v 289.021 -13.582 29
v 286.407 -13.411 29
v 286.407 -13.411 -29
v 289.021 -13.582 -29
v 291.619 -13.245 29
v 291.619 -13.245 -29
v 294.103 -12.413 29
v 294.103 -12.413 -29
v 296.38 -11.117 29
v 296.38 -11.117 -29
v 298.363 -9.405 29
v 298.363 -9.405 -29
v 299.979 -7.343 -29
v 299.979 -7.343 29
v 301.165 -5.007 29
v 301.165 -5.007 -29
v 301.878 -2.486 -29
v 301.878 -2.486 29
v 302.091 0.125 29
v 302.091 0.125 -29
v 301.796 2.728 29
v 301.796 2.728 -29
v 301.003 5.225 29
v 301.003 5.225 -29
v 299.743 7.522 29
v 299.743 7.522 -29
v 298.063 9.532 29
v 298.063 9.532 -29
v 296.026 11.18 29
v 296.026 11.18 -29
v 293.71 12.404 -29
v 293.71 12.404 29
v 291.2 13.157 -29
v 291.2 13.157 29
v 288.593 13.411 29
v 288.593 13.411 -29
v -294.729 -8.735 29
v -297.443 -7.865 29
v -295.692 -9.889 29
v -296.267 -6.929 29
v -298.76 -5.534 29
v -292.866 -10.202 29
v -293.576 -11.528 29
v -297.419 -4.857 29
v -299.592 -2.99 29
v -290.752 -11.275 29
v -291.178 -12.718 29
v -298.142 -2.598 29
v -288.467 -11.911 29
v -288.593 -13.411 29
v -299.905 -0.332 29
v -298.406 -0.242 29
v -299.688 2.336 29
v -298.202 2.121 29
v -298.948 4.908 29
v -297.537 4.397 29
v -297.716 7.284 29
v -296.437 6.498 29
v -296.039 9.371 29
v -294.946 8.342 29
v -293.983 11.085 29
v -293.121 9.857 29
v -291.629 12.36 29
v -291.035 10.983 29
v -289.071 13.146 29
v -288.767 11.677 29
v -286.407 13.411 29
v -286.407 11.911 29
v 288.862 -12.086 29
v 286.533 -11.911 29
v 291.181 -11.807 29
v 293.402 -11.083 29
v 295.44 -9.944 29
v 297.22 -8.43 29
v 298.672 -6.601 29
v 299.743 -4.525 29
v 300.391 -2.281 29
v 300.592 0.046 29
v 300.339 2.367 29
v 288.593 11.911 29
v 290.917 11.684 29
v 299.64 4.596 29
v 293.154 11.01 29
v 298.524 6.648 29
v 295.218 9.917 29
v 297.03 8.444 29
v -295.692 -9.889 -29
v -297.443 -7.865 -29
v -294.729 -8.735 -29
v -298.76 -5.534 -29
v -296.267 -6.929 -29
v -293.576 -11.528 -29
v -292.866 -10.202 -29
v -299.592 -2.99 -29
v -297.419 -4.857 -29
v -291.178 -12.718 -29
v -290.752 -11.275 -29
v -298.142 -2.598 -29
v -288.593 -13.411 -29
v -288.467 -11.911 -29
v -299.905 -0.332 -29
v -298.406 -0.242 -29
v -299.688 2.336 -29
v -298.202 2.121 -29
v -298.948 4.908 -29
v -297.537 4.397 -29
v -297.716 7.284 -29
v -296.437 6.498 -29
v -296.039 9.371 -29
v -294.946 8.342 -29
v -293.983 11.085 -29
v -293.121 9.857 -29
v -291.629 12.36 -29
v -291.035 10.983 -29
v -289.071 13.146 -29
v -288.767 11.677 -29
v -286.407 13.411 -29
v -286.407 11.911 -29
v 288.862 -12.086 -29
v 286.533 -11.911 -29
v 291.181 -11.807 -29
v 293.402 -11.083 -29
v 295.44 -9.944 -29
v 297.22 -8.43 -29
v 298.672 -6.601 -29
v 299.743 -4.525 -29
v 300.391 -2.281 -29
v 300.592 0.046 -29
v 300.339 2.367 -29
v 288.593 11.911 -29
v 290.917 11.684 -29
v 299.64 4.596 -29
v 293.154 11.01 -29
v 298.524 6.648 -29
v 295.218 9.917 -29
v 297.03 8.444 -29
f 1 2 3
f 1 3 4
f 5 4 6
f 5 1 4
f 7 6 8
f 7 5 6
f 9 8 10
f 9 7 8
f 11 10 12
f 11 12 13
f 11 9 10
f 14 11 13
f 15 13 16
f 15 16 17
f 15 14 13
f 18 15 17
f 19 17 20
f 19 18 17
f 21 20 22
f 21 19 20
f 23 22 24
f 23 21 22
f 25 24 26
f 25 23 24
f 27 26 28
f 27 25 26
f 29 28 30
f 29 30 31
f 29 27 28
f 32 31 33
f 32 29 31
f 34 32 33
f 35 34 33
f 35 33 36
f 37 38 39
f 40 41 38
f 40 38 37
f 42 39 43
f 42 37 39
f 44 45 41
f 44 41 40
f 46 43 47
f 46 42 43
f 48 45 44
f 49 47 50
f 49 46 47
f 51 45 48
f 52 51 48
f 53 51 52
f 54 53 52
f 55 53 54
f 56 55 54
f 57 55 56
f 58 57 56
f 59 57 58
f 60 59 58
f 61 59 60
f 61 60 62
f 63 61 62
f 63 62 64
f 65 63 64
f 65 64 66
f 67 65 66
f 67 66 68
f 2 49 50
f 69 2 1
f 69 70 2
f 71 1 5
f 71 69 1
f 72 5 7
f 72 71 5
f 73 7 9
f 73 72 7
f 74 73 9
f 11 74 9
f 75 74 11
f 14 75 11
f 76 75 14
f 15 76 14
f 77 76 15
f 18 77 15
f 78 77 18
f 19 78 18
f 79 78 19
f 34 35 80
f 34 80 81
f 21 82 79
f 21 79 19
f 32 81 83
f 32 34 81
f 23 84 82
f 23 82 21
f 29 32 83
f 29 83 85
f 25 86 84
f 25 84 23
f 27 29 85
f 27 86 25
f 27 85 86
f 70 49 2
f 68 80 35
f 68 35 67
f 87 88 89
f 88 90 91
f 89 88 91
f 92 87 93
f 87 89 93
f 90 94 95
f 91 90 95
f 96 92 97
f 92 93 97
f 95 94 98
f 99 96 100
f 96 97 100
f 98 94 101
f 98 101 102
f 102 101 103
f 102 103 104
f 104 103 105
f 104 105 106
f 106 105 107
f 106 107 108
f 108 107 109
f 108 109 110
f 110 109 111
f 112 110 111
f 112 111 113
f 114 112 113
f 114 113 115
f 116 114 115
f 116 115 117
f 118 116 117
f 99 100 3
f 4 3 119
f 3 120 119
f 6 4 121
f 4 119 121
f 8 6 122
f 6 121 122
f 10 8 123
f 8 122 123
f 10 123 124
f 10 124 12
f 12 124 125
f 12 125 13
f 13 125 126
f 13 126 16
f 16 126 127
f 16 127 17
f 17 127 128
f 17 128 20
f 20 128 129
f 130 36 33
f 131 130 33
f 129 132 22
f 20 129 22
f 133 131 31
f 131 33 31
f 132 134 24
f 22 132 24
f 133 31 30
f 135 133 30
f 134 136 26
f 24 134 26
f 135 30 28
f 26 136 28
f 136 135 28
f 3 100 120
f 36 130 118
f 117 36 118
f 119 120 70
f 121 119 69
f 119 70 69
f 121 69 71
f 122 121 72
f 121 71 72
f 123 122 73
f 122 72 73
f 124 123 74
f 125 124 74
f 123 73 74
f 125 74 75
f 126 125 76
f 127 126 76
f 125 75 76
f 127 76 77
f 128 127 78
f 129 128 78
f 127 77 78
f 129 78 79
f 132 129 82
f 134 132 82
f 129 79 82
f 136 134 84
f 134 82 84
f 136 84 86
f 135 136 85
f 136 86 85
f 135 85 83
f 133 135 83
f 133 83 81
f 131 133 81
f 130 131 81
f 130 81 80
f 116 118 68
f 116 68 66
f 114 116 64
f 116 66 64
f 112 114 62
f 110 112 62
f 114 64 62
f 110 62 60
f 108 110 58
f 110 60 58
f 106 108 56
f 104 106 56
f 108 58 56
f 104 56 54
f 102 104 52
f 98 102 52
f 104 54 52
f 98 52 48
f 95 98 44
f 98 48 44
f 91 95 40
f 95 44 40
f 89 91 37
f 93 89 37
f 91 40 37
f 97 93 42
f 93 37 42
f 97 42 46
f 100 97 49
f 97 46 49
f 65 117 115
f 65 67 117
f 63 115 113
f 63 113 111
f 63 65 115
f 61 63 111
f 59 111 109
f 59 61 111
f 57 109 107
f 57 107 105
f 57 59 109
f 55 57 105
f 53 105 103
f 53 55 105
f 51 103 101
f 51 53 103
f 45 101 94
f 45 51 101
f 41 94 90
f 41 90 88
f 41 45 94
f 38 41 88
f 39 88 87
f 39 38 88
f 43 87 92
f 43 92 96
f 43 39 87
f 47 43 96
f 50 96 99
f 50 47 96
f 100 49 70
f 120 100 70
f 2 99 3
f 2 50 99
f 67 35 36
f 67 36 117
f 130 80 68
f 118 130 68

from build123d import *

# Parameters (mm, degrees)
SALIENTE_EXTRUIR1_DEPTH = 29
VACIADO3_T              = -1.5


with BuildPart() as part:
    # Croquis1 → Saliente-Extruir1 (new, symmetric)
    with BuildSketch(Plane.XY):
        with BuildLine():
            Line((-288.592886812, -13.410938253), (286.407113188, -13.410938253))
            ThreePointArc((286.407113188, -13.410938253), (302.048282251, -1.185571473), (288.592886812, 13.410938253))
            Line((288.592886812, 13.410938253), (-286.407113188, 13.410938253))
            ThreePointArc((-286.407113188, 13.410938253), (-299.862508627, 1.00744798), (-288.592886812, -13.410938253))
        make_face()
    extrude(amount=SALIENTE_EXTRUIR1_DEPTH, both=True)

    # Vaciado3
    vaciado3_openings = [part.faces().sort_by_distance(p)[0] for p in [
        (1.102229912, -0.003188018, 29),
        (1.102229912, -0.003188018, -29),
    ]]
    offset(amount=VACIADO3_T, openings=vaciado3_openings, kind=Kind.INTERSECTION)


solid = part.part
